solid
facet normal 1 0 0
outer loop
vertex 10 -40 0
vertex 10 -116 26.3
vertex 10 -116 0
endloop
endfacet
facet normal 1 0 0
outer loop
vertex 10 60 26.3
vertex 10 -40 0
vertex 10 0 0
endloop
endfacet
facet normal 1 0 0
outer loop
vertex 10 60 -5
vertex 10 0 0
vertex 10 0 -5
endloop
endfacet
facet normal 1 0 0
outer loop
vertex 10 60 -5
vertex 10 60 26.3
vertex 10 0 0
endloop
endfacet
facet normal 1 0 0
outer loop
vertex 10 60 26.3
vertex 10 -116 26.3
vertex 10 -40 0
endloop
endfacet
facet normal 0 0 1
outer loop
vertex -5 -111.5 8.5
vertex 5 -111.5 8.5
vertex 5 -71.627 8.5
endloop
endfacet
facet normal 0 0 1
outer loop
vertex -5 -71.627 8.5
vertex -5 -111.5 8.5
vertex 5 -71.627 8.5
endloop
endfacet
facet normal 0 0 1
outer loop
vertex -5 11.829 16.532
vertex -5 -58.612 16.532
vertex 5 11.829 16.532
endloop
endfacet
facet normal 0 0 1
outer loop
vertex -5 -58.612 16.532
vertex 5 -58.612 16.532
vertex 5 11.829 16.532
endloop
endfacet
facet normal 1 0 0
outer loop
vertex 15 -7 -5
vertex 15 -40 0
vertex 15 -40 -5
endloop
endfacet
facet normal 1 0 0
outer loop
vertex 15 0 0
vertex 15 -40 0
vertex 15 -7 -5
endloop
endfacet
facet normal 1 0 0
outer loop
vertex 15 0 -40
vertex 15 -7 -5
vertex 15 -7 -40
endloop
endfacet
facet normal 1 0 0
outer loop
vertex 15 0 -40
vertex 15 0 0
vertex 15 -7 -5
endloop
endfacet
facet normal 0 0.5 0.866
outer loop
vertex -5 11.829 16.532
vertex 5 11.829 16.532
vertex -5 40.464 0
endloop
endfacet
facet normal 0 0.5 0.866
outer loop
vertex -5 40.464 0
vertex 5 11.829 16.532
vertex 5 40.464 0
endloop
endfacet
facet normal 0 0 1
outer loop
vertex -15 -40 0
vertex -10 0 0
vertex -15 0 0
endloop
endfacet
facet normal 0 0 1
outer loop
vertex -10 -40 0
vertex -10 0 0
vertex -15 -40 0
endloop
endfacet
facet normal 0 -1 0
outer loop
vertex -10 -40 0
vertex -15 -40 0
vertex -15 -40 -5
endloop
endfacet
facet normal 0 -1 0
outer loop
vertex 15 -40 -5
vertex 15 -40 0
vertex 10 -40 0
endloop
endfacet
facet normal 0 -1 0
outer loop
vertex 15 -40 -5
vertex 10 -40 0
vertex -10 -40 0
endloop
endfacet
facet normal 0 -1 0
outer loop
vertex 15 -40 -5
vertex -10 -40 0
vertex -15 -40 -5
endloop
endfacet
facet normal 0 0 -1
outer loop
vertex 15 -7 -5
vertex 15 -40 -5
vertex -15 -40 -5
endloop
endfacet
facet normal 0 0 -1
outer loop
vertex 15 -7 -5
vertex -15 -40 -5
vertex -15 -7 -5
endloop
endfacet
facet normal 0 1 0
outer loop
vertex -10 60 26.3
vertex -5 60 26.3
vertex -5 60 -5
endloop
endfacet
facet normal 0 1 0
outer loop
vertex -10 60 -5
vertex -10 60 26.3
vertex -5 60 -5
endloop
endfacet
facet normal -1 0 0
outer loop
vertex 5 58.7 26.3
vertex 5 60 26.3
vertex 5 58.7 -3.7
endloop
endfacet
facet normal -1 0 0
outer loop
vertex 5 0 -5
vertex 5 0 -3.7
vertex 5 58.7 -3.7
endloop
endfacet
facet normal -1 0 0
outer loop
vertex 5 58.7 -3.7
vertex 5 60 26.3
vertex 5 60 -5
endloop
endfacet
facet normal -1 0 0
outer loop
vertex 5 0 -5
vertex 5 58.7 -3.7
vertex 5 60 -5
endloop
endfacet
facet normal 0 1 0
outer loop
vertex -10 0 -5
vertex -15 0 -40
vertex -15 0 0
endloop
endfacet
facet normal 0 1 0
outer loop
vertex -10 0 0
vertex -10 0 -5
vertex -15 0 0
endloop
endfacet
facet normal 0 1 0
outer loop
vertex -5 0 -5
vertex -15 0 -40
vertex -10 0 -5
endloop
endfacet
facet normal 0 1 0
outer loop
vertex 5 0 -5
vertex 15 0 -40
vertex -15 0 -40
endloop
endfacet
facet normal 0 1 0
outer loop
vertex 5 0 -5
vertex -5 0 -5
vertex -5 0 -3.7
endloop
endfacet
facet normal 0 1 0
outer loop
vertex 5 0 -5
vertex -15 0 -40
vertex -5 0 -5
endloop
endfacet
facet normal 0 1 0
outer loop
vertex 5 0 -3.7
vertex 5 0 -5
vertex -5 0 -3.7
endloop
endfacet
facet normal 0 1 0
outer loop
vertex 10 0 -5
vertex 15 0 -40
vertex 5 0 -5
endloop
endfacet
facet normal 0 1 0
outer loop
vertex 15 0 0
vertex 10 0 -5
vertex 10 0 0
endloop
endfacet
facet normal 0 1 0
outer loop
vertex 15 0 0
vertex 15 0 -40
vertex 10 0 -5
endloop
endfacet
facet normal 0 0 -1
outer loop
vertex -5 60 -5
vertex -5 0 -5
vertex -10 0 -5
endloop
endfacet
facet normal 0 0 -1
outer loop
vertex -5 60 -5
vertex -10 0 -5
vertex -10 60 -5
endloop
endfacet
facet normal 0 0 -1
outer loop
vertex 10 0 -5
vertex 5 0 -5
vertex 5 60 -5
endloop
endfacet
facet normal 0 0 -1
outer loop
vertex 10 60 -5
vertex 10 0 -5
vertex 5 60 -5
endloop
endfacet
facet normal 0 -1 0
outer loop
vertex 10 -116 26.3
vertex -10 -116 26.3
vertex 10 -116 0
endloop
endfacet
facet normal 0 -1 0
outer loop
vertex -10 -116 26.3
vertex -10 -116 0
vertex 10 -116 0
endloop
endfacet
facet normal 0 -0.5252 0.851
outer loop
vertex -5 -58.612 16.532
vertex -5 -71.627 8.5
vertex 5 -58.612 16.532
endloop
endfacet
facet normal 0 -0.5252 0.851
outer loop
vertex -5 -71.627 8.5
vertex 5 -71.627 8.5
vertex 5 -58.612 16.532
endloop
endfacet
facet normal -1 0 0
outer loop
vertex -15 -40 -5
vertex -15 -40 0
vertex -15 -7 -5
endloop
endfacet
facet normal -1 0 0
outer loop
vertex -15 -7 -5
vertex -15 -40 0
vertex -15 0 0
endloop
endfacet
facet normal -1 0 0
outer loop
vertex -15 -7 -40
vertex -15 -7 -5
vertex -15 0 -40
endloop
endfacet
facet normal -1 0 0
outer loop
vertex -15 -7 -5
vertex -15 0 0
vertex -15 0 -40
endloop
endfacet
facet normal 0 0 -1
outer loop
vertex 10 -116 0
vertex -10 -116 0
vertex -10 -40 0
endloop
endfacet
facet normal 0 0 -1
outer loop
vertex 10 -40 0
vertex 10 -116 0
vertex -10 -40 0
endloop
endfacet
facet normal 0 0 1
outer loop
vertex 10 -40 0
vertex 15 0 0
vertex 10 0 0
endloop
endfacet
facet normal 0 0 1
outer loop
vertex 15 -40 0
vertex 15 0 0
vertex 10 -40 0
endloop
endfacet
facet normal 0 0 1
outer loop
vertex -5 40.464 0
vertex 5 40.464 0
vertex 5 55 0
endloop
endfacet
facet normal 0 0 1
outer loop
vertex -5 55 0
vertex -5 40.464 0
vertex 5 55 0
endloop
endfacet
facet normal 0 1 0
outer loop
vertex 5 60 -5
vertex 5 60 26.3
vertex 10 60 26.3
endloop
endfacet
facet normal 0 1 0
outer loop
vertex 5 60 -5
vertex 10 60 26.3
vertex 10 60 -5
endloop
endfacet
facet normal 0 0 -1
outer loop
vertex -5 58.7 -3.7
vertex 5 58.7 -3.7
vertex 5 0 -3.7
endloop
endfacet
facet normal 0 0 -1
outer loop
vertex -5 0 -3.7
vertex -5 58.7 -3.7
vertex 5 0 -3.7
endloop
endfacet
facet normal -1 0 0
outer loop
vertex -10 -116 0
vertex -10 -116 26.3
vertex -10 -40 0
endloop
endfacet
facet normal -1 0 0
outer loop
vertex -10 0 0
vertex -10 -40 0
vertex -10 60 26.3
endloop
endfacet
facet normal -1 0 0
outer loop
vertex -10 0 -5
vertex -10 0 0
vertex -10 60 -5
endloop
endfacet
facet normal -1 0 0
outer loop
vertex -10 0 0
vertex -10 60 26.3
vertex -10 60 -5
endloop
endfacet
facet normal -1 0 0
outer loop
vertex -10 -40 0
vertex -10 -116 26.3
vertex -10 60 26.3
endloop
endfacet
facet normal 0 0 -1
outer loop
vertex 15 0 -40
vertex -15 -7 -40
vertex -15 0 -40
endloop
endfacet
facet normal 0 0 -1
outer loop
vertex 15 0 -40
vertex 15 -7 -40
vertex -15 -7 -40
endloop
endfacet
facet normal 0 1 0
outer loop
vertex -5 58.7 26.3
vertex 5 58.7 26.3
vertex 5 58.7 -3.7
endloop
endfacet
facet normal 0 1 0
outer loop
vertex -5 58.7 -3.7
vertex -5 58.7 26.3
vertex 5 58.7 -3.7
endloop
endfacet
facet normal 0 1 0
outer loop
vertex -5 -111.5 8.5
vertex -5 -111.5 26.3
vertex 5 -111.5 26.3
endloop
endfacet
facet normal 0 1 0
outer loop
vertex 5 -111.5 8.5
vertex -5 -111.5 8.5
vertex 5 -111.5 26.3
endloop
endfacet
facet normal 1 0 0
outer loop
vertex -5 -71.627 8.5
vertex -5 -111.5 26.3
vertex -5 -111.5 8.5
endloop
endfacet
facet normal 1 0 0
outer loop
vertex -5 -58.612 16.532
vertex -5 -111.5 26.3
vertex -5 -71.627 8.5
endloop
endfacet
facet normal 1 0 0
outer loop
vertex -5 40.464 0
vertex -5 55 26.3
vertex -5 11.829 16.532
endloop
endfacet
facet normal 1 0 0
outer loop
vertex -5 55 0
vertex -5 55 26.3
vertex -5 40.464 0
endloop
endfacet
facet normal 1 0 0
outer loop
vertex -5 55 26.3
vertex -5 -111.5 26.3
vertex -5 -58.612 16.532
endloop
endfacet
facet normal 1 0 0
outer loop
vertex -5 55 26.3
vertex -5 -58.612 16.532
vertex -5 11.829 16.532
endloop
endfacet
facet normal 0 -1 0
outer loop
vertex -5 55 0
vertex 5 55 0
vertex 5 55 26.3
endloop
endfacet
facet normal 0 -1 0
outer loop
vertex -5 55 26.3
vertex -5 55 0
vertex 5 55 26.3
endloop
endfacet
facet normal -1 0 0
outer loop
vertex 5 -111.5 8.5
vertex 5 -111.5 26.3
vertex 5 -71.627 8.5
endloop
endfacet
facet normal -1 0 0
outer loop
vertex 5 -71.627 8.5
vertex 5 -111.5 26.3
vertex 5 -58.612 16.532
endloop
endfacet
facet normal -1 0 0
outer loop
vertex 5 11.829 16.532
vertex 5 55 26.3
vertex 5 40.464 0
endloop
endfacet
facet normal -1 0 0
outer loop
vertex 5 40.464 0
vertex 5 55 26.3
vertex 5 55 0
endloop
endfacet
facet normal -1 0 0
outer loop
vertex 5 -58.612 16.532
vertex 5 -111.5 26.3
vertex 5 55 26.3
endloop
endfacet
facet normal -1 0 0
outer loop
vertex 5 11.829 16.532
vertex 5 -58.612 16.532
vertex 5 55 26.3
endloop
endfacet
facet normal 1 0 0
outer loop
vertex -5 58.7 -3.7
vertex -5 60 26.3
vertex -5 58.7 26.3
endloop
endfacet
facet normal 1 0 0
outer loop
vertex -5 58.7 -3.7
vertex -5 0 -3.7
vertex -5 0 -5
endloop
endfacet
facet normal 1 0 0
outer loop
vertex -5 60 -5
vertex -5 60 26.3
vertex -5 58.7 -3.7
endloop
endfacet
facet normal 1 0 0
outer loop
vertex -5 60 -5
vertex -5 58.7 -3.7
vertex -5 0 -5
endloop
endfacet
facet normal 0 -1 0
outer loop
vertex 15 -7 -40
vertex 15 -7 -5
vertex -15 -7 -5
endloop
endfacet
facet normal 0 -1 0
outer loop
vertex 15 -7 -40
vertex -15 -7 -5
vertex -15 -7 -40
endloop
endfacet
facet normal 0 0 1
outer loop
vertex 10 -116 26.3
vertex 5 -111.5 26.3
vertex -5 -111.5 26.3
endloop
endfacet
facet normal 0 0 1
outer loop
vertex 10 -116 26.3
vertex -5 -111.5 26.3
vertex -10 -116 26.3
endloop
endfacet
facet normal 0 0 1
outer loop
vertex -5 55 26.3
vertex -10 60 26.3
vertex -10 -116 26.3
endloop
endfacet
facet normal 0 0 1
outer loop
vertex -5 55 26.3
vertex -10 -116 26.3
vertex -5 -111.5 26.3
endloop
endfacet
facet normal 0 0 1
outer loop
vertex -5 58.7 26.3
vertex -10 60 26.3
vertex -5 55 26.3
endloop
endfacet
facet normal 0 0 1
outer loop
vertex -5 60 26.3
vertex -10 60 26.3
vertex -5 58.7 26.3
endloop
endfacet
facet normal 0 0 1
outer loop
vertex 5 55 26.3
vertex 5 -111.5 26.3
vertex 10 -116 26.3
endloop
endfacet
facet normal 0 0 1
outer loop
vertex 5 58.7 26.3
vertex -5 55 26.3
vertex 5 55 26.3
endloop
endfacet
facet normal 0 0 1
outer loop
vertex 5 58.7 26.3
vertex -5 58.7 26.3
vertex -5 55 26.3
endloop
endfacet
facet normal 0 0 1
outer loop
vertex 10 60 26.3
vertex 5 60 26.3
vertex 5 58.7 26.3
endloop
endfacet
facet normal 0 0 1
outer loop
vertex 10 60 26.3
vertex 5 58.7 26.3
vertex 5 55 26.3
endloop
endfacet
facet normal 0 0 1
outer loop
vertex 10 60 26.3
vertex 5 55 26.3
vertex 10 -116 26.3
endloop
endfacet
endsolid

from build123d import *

# Parameters (mm, degrees)
BOSS_EXTRUDE2_DEPTH = 15
BOSS_EXTRUDE3_DEPTH = 5
BOSS_EXTRUDE4_DEPTH = 5
BOSS_EXTRUDE5_DEPTH = 10
SKETCH9_W           = 10
SKETCH9_H           = 4.5
BOSS_EXTRUDE6_DEPTH = 17.8


with BuildPart() as part:
    # Sketch2 → Boss-Extrude2 (new, symmetric)
    with BuildSketch(Plane(origin=(0, 0, 0), x_dir=(0, 0, -1), z_dir=(1, 0, 0))):
        Polygon((0, 0), (0, -40), (5, -40), (5, -7), (40, -7), (40, 0), align=None)
    extrude(amount=BOSS_EXTRUDE2_DEPTH, both=True)

    # Sketch3 → Boss-Extrude3 (add, symmetric)
    with BuildSketch(Plane(origin=(0, 0, 0), x_dir=(0, 0, -1), z_dir=(1, 0, 0))):
        Polygon((0, -116), (-8.5, -116), (-8.5, -71.626882213), (-16.532330081, -58.612316561), (-16.532330081, 11.829172037), (0, 40.464007705), align=None)
    extrude(amount=BOSS_EXTRUDE3_DEPTH, both=True)

    # Sketch4 → Boss-Extrude4 (add)
    with BuildSketch(Plane.ZY.offset(5)):
        Polygon((0, 60), (26.3, 60), (26.3, -116), (0, -116), (0, 0), (-5, 0), (-5, 60), align=None)
    boss_extrude4 = extrude(amount=BOSS_EXTRUDE4_DEPTH)

    # Mirror1: Boss-Extrude4 across plane
    add(boss_extrude4.mirror(Plane(origin=(0, 0, 0), x_dir=(0, 0, 1), z_dir=(1, 0, 0))))

    # Sketch8 → Boss-Extrude5 (add)
    with BuildSketch(Plane.ZY.offset(-5)):
        Polygon((0, 0), (0, 55), (26.3, 55), (26.3, 58.7), (-3.7, 58.7), (-3.7, 0), align=None)
    extrude(amount=BOSS_EXTRUDE5_DEPTH)

    # Sketch9 → Boss-Extrude6 (add)
    with BuildSketch(Plane.XY.offset(8.5)):
        with Locations((0, -113.75)):
            Rectangle(SKETCH9_W, SKETCH9_H)
    extrude(amount=BOSS_EXTRUDE6_DEPTH)


solid = part.part
